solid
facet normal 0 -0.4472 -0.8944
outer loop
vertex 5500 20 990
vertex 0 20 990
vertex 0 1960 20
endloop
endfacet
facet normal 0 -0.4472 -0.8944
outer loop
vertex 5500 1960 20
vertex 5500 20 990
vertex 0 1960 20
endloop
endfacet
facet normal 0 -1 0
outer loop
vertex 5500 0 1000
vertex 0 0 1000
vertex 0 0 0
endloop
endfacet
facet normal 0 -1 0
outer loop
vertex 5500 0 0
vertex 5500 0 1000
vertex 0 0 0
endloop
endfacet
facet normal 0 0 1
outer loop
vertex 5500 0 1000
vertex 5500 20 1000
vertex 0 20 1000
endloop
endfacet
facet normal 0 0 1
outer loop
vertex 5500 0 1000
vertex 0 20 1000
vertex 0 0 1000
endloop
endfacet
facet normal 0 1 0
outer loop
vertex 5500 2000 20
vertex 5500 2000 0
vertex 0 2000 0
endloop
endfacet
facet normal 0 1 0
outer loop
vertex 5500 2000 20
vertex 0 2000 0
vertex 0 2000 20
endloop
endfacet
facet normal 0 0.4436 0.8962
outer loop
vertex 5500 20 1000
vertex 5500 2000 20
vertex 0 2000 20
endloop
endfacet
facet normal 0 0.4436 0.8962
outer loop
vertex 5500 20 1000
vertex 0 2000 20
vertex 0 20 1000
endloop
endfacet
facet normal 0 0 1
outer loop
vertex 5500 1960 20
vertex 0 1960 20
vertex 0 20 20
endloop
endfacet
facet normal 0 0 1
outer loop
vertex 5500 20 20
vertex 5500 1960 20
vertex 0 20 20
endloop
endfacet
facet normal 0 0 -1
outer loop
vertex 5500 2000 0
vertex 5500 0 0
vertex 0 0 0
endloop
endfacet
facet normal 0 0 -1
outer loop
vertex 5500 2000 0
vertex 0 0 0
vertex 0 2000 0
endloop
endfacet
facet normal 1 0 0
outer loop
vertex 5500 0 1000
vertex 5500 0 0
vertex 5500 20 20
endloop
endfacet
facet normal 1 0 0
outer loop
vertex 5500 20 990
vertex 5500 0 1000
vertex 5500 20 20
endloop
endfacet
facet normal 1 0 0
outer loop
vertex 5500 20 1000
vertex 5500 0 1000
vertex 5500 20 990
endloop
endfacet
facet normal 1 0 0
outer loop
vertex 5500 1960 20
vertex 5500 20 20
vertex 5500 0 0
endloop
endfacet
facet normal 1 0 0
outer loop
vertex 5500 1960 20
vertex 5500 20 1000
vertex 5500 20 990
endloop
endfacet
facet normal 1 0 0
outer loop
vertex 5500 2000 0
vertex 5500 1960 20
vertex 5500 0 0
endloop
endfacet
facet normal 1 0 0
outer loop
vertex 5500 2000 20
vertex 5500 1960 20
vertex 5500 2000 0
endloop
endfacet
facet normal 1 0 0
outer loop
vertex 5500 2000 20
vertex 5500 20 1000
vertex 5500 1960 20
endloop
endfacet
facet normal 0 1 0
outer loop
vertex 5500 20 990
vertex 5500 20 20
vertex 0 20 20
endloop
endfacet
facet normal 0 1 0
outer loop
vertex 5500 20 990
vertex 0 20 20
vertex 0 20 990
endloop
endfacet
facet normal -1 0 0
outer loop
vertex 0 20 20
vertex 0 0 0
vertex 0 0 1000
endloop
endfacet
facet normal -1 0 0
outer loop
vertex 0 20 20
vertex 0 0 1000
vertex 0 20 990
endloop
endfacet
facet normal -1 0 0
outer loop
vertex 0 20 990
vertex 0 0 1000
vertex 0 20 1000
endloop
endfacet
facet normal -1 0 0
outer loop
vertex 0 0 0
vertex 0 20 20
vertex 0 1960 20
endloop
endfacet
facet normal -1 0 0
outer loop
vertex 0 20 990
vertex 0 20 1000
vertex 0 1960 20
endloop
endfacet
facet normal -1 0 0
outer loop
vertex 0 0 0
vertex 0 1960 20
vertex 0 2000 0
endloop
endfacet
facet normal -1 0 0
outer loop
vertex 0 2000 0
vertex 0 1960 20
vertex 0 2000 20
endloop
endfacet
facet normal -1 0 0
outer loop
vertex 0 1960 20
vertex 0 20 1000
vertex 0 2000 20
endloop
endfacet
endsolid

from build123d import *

# Parameters (mm, degrees)
F1_DEPTH = 5500


with BuildPart() as f1:
    # F0 (on Right) → F1 (new body)
    with BuildSketch(Plane.YZ):
        Polygon((0, 20), (0, 0), (20, 0), (2000, 0), (2000, 20), (20, 1000), (0, 1000), align=None)
        Polygon((1960, 20), (20, 20), (20, 990), align=None, mode=Mode.SUBTRACT)
    extrude(amount=F1_DEPTH)


solid = f1.part
